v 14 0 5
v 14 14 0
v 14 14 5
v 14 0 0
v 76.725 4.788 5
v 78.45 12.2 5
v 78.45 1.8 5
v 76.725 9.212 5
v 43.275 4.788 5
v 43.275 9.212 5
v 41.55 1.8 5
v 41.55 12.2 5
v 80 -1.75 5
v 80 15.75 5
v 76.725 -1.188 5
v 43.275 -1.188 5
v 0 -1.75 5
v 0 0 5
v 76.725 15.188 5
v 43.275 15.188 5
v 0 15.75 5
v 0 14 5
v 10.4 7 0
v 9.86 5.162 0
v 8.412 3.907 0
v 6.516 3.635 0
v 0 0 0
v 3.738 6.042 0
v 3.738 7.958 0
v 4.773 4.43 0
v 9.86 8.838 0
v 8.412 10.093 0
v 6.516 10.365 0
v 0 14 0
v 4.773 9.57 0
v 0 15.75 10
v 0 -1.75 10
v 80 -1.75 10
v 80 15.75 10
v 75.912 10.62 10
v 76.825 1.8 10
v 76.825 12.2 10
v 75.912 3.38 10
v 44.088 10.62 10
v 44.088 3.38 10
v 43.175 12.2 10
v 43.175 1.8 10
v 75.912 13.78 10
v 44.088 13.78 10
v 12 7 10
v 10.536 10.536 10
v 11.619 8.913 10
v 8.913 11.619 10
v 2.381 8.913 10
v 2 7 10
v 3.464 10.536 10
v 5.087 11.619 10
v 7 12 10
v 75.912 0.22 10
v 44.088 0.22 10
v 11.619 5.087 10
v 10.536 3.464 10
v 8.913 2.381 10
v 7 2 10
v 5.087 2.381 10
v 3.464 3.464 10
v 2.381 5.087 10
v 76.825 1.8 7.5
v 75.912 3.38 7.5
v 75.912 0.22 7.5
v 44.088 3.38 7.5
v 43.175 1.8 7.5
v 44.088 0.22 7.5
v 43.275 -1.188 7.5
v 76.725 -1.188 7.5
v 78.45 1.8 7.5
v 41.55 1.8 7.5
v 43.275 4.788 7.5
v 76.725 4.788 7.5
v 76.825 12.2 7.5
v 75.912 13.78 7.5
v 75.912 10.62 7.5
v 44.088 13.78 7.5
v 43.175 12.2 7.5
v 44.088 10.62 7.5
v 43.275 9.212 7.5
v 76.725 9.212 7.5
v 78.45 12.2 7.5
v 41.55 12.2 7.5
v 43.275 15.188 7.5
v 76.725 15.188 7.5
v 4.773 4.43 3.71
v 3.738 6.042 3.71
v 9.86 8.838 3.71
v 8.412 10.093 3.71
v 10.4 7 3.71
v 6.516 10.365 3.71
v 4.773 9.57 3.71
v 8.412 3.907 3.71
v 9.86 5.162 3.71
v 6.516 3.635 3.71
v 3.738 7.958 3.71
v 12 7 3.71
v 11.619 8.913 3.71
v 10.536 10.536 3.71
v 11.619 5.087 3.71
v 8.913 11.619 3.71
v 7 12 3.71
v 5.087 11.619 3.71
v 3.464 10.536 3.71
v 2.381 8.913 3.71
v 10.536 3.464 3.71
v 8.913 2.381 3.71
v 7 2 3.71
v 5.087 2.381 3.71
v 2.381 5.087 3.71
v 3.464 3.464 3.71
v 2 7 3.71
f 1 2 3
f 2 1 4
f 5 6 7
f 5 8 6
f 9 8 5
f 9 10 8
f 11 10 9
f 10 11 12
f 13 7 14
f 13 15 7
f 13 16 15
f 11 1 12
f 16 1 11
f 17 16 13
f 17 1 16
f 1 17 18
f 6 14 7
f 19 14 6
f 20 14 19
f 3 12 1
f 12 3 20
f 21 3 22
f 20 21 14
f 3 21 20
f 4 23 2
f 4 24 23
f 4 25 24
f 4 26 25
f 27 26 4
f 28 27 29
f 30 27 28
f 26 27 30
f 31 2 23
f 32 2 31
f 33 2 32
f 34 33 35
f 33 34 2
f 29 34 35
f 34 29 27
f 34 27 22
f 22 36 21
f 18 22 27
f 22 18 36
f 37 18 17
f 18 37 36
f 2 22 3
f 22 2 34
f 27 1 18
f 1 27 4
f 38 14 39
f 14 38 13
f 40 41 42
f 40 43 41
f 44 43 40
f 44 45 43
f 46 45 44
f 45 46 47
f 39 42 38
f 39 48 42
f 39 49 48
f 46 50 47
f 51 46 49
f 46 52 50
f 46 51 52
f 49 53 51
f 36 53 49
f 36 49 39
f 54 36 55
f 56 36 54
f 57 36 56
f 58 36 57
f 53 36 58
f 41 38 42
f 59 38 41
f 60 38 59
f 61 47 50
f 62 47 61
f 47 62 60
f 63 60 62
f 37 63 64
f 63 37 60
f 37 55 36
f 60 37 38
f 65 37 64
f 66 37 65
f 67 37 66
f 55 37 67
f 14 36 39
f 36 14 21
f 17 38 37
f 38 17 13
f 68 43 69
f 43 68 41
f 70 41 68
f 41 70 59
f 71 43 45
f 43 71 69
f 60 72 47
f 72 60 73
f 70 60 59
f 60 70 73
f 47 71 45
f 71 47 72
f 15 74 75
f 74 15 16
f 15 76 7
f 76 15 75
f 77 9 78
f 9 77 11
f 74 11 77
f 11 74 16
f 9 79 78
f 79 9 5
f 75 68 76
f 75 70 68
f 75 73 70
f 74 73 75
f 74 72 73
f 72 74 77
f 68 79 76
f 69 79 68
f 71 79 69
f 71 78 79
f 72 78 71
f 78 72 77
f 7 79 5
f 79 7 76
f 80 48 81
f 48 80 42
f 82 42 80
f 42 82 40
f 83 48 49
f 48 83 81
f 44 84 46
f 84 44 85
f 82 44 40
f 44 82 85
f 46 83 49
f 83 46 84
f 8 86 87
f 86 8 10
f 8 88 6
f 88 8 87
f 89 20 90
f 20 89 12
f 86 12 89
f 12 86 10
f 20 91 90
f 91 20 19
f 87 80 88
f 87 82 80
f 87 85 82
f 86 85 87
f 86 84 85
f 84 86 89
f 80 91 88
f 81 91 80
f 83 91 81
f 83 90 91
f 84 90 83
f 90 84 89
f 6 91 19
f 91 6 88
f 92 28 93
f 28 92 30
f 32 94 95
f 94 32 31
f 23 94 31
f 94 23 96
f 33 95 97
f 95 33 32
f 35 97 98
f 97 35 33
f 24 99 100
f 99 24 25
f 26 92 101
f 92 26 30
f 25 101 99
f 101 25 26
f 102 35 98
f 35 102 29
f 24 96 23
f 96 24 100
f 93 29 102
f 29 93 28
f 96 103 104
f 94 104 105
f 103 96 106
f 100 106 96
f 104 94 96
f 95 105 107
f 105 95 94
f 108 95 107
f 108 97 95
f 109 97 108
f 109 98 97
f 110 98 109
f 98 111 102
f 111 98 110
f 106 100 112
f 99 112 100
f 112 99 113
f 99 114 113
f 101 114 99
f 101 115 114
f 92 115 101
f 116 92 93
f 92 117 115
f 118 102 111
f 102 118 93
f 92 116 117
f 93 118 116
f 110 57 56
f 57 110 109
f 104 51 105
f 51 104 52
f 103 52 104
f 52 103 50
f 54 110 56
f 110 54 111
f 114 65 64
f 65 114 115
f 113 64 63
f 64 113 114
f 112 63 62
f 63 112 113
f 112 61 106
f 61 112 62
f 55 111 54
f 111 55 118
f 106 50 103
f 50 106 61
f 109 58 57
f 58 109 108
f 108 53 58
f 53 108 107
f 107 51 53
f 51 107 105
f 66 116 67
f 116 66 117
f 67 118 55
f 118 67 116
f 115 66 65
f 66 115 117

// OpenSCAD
holeDistance=19;
holeThickness=3;
length=66;
width=17.5;

socketSlotWidth=6;
socketBorderWidth=4;
socketWidth=socketBorderWidth+socketBorderWidth+socketSlotWidth;

socketHeight=5;

m3ScrewRaduis=3.65/2;
m3NutHeight=2.5;

wallThickness = 6;

holder();

module holder(){
	difference(){
		union(){
			socket();
			translate([0,-(width-socketWidth)/2,socketHeight])optoSocket();
		}
		translate([45,1.8,0])screw3(10,30); 
		translate([45,socketWidth-1.8])screw3(10,30); 
		#translate([socketWidth/2,socketWidth/2,-1.29])m5Screw(socketHeight,6.3);
	}
}

module socket(){
	cube([socketWidth, socketWidth,  socketHeight]);
}

module optoSocket(){
	cube([length+socketWidth, width,  socketHeight]);
}

module screw3(screwLength=10, slotLength=10) {
	hull(){
		cylinder(h=screwLength, r=m3ScrewRaduis);
		#translate([slotLength,0,0])cylinder(h=screwLength, r=m3ScrewRaduis);
	}
	hull(){
		cylinder(h=socketHeight+m3NutHeight,r=6.9/2,$fn=6);
		translate([slotLength,0,0])cylinder(h=socketHeight+m3NutHeight,r=6.9/2,$fn=6);
		
	}
}

module m5Screw(h=10,headH=3) {
	union() {
		cylinder(h=h,r=3.4);
		translate([0,0,h])cylinder(h=headH,r=5);
	}
}
//nema17Width=42.30;
//slotWidth=4.5;
//slotHeight=0.6;
//
//difference(){
//	translate([-wallThickness,-(nema17Width-40)/2-wallThickness,-1])cube([40+wallThickness,nema17Width+(wallThickness*2),nema17Width+wallThickness+5]);
//	translate([0,-(nema17Width-40)/2,wallThickness+5])nema17Big();
//	translate([-100,0,-40])profile5_40x40(200);
//	rotate([0,0,90])translate([-100,-40,-40])profile5_40x40(200);
//	#translate([10,10,-slotHeight-0.1])m5Screw(6,6);
//	translate([10,30,-slotHeight-0.1])m5Screw(6,6);
//	translate([30,10,-slotHeight-0.1])m5Screw(6,6);
//	translate([30,30,-slotHeight-0.1])m5Screw(6,6);
//	translate([55,50,56])rotate([90,0,0])cylinder(h=60,r=50);
//}
//
//module nema17Big(){
//	union(){
//		cube([60,nema17Width,nema17Width]);
//		translate([0,nema17Width/2,nema17Width/2])rotate([0,-90,0])cylinder(h=22,r=6/2);
//		translate([0.1,nema17Width/2,nema17Width/2])rotate([0,-90,0])cylinder(h=0.2+wallThickness,r=22.5/2);
//		translate([0.1,5.5,5.5])rotate([0,-90,0])m3Screw(5.5,40);
//		translate([0.1,nema17Width-5.5,5.5])rotate([0,-90,0])m3Screw(5.5,40);
//		translate([0.1,5.5,nema17Width-5.5])rotate([0,-90,0])m3Screw(5.5,40);
//		translate([0.1,nema17Width-5.5,nema17Width-5.5])rotate([0,-90,0])m3Screw(5.5,40);
//	}
//}
//
//module m3Screw(h=10,headH=3) {
//	union() {
//		cylinder(h=h,r=1.7);
//		translate([0,0,h])cylinder(h=headH,r=5.65/2);
//	}
//}
//
//module m5Screw(h=10,headH=5.5) {
//	union() {
//		cylinder(h=h,r=2.5);
//		translate([0,0,h])cylinder(h=headH,r=4.25);
//	}
//}
//
//module profile5_20x20(l=100) {
//	difference(){
//		cube([l,20,20]);
//		translate([0,(20/2)-slotWidth/2,0])cube([l,slotWidth,slotHeight]);
//		translate([0,(20/2)-slotWidth/2,20-slotHeight])cube([l,slotWidth,slotHeight]);
//		translate([0,0,(20/2)-(slotWidth/2)])cube([l,slotHeight,slotWidth]);
//		translate([0,20-slotHeight,(20/2)-(slotWidth/2)])cube([l,slotHeight,slotWidth]);
//		
//	}
//	
//}
//
//module profile5_40x40(l=100) {
//	union(){
//		profile5_20x20(l);
//		translate([0,20,0])profile5_20x20(l);
//		translate([0,20,20])profile5_20x20(l);
//		translate([0,0,20])profile5_20x20(l);
//	}
//	
//}
